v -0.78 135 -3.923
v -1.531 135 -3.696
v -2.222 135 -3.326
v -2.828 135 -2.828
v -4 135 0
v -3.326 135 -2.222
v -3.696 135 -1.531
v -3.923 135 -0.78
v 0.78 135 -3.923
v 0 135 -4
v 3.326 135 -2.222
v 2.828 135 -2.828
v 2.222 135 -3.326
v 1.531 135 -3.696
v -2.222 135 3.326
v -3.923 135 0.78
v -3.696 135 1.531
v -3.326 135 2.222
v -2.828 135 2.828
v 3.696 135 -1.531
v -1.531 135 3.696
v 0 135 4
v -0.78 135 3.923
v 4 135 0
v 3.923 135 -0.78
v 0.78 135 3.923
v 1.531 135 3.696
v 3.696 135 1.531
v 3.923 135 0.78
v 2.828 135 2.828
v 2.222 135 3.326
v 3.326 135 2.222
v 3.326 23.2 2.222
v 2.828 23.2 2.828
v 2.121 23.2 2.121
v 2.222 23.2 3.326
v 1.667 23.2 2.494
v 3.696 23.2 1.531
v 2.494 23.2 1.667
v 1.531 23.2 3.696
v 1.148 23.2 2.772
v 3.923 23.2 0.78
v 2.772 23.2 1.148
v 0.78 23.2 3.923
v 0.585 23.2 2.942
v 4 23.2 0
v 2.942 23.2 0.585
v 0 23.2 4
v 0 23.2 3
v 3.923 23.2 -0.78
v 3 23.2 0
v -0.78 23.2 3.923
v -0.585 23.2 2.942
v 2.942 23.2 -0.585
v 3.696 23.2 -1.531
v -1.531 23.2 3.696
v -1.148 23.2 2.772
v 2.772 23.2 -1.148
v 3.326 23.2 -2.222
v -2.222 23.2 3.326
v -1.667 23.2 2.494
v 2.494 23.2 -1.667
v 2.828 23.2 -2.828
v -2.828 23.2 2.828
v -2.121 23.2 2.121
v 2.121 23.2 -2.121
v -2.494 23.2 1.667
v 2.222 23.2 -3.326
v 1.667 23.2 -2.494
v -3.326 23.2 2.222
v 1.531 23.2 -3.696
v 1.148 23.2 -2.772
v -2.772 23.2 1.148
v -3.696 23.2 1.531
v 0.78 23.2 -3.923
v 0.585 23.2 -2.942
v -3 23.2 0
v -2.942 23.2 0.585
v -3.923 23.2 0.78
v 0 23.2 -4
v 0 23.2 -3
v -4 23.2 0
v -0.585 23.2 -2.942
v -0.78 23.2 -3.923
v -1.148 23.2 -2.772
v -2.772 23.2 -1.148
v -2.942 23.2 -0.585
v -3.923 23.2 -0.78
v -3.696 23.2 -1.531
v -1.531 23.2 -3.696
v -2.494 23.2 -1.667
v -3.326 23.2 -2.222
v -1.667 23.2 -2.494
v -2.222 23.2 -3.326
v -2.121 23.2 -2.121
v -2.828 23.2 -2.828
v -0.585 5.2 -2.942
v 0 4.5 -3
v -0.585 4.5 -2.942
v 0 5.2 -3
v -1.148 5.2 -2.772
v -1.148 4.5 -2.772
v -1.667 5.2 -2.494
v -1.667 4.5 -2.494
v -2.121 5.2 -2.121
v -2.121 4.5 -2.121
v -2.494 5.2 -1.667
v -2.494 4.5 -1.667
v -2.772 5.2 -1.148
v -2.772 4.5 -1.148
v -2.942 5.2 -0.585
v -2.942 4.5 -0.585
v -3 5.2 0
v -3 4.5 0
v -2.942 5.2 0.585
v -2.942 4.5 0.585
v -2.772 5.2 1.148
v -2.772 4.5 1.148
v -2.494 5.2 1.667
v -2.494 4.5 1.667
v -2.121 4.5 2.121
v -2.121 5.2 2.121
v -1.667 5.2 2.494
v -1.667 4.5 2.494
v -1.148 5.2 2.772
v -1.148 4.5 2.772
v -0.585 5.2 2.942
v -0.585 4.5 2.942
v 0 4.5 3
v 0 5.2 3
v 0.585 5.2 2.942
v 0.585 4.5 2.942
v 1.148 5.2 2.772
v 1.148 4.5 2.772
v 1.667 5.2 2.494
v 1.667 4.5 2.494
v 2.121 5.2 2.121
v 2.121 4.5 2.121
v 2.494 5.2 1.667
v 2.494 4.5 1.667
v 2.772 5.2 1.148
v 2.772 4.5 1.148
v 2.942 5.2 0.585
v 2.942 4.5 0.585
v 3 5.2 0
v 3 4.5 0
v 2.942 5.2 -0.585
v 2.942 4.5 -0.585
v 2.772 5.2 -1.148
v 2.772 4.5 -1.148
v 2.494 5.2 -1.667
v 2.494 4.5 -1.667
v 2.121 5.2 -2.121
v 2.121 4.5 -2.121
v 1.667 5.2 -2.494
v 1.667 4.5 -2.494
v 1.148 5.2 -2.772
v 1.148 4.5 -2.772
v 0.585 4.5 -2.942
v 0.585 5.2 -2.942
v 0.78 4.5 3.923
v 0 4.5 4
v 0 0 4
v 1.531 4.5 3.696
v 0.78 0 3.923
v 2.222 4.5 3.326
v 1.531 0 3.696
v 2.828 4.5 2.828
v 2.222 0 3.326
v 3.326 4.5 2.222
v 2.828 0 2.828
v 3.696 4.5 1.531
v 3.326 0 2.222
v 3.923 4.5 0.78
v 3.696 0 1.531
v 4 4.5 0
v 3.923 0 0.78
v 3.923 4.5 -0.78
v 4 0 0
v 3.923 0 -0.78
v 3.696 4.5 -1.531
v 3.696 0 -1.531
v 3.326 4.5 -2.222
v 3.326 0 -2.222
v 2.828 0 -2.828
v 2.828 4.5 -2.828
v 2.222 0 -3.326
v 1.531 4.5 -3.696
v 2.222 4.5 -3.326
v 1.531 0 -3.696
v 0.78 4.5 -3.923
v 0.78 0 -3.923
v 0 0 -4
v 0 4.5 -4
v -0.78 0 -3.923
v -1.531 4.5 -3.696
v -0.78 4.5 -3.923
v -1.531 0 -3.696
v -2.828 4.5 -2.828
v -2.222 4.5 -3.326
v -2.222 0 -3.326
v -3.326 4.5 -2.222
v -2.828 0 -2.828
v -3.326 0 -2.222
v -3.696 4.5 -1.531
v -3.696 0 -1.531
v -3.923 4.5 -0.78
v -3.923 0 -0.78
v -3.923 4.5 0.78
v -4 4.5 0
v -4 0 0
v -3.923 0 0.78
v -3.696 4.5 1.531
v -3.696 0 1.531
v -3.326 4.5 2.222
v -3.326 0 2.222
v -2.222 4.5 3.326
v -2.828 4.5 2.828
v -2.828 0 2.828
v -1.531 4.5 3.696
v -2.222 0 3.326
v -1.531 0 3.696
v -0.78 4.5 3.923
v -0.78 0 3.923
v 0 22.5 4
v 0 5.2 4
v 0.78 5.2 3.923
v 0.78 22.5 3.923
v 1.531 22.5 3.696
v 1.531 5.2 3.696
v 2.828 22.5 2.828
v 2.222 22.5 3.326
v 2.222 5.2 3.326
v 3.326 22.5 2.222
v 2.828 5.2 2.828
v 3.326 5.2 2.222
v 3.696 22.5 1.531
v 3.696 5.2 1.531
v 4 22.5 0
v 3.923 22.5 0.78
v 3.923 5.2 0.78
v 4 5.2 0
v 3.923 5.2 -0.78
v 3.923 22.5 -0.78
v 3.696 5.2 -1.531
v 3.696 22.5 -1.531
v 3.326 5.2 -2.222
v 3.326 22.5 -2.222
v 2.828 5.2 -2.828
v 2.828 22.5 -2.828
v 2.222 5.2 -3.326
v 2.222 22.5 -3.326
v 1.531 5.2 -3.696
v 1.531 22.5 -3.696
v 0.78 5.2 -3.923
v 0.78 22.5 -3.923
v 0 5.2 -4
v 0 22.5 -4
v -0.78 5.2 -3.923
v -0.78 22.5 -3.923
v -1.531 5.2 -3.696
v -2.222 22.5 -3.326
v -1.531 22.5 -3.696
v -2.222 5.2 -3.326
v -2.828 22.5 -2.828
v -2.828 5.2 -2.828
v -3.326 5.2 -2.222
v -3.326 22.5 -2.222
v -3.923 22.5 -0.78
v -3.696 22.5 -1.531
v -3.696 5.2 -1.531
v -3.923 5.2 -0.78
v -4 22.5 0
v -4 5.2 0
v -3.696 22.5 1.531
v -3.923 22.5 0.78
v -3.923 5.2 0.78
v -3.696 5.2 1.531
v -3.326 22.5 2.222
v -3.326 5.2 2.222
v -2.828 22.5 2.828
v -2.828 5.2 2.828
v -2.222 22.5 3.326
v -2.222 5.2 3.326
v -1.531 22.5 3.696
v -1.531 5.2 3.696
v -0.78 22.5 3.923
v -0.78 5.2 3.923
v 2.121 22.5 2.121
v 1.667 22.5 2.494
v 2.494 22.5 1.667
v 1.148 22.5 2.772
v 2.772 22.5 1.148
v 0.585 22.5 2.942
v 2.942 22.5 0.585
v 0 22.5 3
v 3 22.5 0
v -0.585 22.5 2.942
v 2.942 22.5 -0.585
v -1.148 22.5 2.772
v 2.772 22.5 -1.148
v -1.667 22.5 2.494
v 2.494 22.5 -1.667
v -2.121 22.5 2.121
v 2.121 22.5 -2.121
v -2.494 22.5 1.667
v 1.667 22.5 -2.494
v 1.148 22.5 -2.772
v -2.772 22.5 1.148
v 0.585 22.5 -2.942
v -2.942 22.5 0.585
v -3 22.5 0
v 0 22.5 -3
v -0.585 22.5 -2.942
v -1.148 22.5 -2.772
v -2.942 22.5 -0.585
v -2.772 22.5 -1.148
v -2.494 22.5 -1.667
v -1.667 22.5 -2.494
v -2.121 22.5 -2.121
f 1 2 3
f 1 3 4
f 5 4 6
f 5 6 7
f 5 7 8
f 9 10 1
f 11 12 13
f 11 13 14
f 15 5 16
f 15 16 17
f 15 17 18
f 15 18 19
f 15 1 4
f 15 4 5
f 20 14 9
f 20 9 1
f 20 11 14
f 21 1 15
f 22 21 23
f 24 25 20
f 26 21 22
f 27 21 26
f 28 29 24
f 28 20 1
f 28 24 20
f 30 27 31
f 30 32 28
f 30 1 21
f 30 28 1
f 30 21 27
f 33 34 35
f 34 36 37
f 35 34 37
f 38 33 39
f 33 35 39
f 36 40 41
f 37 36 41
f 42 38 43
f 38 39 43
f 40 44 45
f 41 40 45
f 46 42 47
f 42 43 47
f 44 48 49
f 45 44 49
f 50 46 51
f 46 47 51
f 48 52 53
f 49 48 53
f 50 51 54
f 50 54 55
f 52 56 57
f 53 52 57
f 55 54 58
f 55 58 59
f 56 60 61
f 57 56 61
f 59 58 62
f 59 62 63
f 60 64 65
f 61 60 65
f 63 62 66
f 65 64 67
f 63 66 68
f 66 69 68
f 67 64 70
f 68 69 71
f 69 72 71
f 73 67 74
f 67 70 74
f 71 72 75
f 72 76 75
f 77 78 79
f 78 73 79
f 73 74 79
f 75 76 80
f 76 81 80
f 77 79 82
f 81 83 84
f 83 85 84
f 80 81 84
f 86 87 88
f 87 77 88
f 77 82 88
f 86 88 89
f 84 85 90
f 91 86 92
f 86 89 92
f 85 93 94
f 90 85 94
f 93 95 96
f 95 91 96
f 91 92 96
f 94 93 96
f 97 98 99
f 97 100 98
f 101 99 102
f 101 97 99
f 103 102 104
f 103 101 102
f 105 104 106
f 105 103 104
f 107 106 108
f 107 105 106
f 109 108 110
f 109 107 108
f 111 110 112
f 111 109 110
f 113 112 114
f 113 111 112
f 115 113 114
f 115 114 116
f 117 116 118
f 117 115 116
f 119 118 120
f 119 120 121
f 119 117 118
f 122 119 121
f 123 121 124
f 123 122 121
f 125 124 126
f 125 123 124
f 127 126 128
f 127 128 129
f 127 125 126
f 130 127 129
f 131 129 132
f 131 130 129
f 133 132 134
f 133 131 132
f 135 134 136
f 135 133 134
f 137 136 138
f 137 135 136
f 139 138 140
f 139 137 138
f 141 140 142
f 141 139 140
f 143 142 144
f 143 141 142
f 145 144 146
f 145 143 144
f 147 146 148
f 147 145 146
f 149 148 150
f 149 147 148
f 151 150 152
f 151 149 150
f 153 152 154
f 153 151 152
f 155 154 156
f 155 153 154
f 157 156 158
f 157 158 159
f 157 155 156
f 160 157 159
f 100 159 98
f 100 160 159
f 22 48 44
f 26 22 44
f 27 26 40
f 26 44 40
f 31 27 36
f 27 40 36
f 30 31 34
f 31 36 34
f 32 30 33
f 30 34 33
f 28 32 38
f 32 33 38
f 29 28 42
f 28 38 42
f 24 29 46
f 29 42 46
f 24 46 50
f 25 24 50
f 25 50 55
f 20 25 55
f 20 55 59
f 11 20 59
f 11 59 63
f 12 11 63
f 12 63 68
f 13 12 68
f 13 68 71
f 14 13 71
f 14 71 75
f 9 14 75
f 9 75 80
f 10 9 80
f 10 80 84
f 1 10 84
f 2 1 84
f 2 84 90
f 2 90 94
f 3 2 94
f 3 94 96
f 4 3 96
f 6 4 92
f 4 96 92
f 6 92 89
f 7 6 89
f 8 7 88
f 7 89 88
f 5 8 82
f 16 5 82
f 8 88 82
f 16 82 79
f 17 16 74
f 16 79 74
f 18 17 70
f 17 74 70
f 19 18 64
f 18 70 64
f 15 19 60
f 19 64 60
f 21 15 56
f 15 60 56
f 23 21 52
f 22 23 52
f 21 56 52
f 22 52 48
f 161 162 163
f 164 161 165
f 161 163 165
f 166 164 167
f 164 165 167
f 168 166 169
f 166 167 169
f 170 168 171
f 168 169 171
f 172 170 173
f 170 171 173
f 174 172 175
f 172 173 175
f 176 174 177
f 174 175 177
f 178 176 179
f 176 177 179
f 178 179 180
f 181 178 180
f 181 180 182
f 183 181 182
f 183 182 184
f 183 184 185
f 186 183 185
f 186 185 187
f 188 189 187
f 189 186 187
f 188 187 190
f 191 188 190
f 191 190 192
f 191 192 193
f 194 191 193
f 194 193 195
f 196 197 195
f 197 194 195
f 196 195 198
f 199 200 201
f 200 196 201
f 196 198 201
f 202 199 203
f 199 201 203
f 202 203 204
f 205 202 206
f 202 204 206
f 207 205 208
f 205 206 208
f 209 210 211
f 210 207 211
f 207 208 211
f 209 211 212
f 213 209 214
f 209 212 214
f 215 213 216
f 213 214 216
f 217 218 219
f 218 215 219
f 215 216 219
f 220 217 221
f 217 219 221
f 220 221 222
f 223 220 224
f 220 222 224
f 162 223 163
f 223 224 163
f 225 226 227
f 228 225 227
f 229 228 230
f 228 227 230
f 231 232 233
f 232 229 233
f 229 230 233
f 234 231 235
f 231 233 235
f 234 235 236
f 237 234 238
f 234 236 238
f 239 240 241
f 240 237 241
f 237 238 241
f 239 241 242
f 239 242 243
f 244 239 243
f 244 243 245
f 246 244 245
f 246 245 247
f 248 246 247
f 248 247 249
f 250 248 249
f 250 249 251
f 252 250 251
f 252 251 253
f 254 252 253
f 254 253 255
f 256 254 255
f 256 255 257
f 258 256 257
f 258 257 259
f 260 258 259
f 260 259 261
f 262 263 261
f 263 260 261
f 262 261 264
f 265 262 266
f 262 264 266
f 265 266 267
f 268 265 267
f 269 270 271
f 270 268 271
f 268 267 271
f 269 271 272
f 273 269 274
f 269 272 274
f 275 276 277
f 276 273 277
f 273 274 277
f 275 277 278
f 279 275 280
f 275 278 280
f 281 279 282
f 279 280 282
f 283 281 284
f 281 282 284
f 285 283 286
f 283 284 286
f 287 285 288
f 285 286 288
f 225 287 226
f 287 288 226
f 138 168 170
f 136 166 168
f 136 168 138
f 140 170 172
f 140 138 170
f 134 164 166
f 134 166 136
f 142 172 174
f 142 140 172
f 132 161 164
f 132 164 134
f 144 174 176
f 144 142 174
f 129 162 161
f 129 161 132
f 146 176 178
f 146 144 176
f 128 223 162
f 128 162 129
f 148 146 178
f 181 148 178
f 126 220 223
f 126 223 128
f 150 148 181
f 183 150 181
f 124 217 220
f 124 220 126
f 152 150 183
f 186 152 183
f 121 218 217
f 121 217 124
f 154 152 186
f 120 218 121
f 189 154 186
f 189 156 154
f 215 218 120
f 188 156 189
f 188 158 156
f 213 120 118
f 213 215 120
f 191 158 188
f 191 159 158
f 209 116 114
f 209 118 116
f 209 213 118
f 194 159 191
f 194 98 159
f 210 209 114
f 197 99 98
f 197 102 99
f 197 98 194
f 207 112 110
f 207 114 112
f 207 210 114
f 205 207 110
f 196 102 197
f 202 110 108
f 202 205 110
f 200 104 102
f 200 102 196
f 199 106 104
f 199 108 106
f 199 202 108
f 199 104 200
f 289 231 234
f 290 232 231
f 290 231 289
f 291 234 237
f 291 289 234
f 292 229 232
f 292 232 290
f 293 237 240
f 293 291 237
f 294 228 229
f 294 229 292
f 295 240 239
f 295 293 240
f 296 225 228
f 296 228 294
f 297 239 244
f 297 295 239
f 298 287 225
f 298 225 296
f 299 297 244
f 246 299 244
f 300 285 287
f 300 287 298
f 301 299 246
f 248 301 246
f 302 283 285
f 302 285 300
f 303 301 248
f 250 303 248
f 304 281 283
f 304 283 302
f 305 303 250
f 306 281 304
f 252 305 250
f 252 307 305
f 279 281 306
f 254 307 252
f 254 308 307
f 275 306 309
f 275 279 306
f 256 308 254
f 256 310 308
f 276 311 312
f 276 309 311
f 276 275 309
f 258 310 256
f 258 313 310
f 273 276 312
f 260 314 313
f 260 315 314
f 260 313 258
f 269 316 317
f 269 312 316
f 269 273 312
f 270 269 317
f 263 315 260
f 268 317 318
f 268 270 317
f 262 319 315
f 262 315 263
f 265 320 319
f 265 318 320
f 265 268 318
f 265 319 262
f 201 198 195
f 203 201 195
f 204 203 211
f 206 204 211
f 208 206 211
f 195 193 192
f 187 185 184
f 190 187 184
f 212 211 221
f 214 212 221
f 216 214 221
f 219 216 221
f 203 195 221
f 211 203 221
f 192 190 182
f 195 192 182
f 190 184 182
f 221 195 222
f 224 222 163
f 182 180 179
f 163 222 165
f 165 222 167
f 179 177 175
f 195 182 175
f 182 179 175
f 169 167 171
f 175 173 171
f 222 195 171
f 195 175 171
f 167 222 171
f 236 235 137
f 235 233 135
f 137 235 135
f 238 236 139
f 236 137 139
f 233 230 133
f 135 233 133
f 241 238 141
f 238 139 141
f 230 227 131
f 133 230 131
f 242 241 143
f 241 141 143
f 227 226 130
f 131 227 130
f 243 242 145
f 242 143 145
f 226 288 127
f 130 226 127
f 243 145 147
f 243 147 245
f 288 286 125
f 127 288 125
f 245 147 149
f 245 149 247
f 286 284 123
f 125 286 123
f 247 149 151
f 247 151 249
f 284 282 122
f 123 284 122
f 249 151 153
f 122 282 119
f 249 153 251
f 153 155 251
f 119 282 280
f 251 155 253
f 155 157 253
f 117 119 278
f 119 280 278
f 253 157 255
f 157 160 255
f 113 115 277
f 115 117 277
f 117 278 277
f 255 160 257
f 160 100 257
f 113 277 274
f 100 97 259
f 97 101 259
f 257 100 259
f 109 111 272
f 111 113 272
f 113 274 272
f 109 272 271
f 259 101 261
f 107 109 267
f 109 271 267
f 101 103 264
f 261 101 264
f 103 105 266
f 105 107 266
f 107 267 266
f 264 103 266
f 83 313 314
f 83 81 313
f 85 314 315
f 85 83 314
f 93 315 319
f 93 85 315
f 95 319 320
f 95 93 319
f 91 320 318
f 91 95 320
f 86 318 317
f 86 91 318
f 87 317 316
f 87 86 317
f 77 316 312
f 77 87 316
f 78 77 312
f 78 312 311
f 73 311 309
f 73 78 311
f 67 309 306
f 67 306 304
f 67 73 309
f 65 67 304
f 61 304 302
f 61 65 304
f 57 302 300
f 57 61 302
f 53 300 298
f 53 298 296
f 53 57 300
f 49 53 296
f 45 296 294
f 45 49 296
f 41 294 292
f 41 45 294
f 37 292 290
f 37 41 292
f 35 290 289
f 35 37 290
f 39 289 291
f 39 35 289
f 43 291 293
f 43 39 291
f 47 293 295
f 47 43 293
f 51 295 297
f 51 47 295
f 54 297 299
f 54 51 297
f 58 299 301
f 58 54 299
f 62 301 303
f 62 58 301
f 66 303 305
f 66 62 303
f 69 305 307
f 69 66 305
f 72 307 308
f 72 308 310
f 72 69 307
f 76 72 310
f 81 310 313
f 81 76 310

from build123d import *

# Parameters (mm, degrees)
SKETCH1_R           = 4
BOSS_EXTRUDE1_DEPTH = 135
SKETCH2_W           = 1
SKETCH2_H           = 0.7
LPATTERN1_COUNT     = 2
LPATTERN1_PITCH     = 18


with BuildPart() as part:
    # Sketch1 → Boss-Extrude1 (new body)
    with BuildSketch(Plane(origin=(0, 0, 0), x_dir=(1, 0, 0), z_dir=(0, 1, 0))):
        with Locations(Location((0, 0, 0), (0, 0, 270))):
            Circle(SKETCH1_R)
    extrude(amount=BOSS_EXTRUDE1_DEPTH)

    # Sketch2 → Cut-Revolve1 (revolve, cut)
    with BuildSketch(Plane.XY, mode=Mode.PRIVATE) as cut_revolve1_sk:
        with Locations((-3.5, 4.85)):
            Rectangle(SKETCH2_W, SKETCH2_H)
    cut_revolve1 = revolve(cut_revolve1_sk.sketch.rotate(Axis((0, 0, 0), (0, 1, 0)), 270), axis=Axis((0, 0, 0), (0, 1, 0)), mode=Mode.SUBTRACT)

    # LPattern1: Cut-Revolve1 ×2
    with Locations(*[(0, i * LPATTERN1_PITCH, 0) for i in range(1, LPATTERN1_COUNT)]):
        add(cut_revolve1, mode=Mode.SUBTRACT)


solid = part.part
